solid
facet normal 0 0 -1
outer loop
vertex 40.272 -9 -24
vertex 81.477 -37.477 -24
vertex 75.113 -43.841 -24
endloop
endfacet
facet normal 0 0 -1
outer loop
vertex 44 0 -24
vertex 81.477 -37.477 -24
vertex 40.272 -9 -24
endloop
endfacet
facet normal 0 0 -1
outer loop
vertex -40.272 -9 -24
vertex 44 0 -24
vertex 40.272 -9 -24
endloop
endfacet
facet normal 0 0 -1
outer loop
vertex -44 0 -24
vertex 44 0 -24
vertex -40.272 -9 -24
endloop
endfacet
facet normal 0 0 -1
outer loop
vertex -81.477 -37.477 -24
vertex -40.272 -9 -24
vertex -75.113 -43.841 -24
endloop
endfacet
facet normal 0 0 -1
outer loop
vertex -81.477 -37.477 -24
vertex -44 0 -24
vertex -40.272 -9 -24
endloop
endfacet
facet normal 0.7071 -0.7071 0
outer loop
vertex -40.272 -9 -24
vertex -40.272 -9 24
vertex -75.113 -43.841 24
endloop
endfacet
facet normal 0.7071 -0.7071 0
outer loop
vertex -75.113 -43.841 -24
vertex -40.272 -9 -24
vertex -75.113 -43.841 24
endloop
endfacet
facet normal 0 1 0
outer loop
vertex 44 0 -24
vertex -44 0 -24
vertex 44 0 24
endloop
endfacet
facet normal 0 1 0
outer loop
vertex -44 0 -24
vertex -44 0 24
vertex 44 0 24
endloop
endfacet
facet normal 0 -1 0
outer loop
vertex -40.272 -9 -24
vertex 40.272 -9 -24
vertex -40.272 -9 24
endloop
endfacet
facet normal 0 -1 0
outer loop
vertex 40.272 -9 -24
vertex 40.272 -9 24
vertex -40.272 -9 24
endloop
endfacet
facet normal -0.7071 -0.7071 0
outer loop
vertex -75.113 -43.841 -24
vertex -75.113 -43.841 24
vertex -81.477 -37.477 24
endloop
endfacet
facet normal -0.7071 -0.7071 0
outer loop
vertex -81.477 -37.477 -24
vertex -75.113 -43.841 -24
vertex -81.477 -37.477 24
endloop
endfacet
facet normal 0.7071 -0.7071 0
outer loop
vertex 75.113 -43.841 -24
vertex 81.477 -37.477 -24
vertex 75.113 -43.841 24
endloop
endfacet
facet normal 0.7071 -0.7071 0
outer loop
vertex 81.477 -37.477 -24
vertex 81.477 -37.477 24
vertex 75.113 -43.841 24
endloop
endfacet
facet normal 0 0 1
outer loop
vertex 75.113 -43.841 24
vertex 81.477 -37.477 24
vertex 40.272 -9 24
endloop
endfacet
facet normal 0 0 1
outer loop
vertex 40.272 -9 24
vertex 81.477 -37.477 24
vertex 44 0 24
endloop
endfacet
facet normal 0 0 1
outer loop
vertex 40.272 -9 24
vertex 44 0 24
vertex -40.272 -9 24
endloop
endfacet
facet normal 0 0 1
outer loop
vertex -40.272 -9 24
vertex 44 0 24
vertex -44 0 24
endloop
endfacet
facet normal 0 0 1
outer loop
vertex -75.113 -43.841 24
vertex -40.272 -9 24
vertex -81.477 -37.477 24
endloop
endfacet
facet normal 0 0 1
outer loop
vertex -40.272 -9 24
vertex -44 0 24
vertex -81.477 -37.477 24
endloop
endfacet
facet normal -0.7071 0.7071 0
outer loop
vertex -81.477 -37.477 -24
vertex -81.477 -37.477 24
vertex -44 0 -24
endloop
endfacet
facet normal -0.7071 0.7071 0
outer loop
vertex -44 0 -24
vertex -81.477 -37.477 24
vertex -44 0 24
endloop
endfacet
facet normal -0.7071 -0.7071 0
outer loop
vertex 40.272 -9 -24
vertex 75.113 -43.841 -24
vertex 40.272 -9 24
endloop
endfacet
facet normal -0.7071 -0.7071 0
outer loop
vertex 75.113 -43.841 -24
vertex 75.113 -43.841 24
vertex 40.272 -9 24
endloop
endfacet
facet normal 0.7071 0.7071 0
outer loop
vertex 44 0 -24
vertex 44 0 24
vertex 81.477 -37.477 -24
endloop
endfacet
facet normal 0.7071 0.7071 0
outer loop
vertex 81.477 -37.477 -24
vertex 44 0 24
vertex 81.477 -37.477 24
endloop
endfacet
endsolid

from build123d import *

# Parameters (mm, degrees)
EXTRUDE_THIN1_DEPTH = 24


with BuildPart() as part:
    # Sketch1 → Extrude-Thin1 (new body, symmetric)
    with BuildSketch(Plane.XY):
        Polygon((-81.476659403, -37.476659403), (-44, 0), (44, 0), (81.476659403, -37.476659403), (75.112698372, -43.840620434), (40.272077939, -9), (-40.272077939, -9), (-75.112698372, -43.840620434), align=None)
    extrude(amount=EXTRUDE_THIN1_DEPTH, both=True)


solid = part.part
